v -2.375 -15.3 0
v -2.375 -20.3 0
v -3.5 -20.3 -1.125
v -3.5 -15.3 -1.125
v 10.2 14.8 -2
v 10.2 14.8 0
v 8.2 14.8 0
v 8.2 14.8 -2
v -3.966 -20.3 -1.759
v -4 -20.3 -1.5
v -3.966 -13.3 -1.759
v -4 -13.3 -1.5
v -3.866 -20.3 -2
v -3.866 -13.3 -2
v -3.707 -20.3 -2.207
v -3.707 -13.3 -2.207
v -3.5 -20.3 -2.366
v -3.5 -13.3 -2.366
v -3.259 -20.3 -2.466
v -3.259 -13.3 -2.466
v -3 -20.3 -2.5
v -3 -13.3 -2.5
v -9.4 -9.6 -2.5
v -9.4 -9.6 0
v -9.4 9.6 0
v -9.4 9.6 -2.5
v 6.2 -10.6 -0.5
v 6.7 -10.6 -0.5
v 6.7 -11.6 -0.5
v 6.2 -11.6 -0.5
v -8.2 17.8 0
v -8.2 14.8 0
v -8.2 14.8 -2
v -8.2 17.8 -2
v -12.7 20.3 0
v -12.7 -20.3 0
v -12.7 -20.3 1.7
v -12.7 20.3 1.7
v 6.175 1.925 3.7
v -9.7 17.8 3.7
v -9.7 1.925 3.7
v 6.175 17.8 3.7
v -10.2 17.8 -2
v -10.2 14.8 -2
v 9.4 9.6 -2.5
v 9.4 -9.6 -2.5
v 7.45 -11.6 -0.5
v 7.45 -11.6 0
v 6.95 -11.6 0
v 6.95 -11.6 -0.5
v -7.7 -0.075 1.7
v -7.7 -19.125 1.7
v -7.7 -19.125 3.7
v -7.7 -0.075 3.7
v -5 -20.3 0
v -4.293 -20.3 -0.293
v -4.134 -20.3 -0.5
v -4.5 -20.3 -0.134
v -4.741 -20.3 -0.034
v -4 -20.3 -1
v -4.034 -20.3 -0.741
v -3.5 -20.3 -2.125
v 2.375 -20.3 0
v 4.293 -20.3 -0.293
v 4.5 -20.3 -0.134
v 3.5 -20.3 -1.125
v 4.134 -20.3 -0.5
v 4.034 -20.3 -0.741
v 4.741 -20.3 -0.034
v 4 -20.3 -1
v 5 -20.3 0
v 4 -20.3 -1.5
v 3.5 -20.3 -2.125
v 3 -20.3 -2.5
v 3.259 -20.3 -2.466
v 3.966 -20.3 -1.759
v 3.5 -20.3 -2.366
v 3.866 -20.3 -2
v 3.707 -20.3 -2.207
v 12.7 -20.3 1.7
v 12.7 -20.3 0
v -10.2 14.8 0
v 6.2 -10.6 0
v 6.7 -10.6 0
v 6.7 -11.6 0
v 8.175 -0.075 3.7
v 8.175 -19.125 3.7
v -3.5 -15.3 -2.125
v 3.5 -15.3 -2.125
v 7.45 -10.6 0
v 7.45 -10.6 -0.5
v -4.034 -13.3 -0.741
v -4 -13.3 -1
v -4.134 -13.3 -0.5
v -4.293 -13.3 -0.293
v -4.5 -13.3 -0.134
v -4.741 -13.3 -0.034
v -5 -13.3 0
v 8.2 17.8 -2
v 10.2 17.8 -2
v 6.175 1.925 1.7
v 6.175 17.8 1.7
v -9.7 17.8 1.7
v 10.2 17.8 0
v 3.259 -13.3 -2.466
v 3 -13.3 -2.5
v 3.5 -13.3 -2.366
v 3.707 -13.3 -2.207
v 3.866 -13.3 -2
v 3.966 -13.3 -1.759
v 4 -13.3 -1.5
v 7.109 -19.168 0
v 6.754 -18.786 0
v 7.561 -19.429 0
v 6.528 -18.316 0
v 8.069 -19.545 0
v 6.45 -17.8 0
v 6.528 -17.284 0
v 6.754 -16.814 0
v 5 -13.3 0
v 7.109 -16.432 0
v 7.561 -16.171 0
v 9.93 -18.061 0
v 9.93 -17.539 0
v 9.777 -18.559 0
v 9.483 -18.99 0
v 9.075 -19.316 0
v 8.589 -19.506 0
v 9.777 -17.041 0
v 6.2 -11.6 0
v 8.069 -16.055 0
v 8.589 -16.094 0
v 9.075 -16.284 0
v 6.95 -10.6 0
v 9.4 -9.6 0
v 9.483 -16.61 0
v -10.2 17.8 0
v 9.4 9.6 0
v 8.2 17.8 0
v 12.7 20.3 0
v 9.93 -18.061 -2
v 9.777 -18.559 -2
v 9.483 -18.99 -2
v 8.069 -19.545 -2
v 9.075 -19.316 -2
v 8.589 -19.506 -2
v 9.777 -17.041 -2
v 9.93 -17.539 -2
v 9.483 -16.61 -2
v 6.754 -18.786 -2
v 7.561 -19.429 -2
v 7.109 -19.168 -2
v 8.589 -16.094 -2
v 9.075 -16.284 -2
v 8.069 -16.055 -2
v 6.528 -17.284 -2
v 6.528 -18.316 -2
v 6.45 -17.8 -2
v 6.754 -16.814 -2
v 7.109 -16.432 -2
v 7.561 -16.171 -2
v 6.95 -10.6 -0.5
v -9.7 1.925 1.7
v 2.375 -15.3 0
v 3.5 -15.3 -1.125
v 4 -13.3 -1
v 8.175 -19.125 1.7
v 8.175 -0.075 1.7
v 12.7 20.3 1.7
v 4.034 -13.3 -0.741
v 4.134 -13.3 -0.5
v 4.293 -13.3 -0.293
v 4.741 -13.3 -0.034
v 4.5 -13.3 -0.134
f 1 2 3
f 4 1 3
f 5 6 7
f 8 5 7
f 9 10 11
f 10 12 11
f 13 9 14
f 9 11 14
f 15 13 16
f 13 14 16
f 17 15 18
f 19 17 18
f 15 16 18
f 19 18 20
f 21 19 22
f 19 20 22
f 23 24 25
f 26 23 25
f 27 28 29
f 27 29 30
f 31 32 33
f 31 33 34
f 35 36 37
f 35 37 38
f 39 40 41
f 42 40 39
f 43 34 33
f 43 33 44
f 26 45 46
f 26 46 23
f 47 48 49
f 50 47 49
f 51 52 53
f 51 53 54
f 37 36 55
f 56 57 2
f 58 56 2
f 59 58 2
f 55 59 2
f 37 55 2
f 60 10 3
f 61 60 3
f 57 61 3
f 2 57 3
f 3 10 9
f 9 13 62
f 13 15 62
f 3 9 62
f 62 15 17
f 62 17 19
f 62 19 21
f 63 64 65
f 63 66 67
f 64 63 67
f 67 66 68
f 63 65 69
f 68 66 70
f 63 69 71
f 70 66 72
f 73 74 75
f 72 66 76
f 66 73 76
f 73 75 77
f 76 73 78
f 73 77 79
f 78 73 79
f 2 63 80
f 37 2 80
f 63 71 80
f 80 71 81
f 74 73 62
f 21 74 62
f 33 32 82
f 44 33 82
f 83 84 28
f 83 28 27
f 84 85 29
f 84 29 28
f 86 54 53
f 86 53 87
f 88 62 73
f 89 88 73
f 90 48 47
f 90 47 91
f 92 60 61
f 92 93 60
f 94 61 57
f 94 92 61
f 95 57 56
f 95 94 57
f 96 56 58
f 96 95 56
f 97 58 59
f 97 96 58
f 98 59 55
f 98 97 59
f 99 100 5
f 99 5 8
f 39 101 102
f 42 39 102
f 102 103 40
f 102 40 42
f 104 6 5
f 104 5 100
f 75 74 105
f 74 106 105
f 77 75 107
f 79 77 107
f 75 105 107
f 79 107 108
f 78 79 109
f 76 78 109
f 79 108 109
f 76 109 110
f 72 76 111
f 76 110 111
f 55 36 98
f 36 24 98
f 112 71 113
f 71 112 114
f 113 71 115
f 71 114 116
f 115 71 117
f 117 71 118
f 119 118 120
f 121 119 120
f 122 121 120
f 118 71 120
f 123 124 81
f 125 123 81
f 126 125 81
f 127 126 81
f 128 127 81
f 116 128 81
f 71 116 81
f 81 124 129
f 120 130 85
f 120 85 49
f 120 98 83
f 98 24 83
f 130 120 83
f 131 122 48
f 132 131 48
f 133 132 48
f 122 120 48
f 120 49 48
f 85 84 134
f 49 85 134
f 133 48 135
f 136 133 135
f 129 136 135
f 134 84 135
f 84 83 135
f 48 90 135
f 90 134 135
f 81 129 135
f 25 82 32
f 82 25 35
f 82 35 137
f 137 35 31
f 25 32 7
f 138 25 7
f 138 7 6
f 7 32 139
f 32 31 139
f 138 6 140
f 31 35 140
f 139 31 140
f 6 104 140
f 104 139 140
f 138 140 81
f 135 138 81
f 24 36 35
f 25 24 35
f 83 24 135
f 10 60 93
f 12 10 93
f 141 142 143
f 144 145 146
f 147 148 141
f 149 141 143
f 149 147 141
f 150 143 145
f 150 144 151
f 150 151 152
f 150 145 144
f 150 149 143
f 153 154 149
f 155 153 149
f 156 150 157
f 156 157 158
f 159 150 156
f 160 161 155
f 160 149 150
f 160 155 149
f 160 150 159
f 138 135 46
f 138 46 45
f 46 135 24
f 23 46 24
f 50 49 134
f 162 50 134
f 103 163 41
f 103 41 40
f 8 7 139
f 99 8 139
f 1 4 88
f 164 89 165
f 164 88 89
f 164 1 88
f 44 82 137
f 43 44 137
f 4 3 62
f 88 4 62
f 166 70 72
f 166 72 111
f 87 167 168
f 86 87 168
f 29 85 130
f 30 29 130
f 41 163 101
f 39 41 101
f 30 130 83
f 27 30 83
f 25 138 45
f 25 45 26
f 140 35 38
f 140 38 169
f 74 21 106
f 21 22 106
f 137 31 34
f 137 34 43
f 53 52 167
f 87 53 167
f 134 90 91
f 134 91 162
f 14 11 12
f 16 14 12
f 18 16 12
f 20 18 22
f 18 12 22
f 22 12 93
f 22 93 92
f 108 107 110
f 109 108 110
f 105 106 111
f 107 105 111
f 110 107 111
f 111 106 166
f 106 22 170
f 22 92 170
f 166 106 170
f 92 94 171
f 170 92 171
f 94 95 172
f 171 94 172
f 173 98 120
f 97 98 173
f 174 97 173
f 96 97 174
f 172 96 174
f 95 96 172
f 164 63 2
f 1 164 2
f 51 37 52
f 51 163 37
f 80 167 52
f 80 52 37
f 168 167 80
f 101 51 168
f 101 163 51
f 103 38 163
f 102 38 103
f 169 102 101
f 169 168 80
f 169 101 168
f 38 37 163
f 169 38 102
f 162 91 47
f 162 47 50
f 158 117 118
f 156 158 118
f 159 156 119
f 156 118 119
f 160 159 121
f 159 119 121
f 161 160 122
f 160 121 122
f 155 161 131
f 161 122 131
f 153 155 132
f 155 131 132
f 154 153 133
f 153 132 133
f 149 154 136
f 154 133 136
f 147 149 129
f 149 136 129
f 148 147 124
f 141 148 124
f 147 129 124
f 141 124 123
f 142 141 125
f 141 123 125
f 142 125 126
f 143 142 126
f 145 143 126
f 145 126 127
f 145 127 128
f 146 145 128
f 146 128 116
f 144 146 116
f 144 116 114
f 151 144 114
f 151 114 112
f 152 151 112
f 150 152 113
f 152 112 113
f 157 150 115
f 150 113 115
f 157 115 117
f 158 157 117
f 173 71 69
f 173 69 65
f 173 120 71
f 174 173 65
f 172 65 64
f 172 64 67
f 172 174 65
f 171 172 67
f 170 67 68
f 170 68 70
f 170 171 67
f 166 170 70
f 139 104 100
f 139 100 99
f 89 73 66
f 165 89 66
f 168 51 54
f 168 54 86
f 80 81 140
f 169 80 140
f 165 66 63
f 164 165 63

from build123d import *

# Parameters (mm, degrees)
SKETCH1_W           = 25.4
SKETCH1_H           = 40.6
BOSS_EXTRUDE1_DEPTH = 1.7
SKETCH2_W           = 8
SKETCH2_H           = 7
BOSS_EXTRUDE2_DEPTH = 2.5
CUT_EXTRUDE2_DEPTH  = 5
FILLET1_R           = 1
FILLET2_R           = 1
SKETCH4_W           = 18.8
SKETCH4_H           = 19.2
BOSS_EXTRUDE3_DEPTH = 2.5
SKETCH5_R           = 1.75
BOSS_EXTRUDE4_DEPTH = 2
SKETCH6_W           = 0.5
SKETCH6_H           = 1
BOSS_EXTRUDE5_DEPTH = 0.5
SKETCH7_W           = 2
SKETCH7_H           = 3
BOSS_EXTRUDE6_DEPTH = 2
SKETCH8_W           = 15.875
SKETCH8_H           = 15.875
SKETCH8_H_2         = 19.05
BOSS_EXTRUDE7_DEPTH = 2


with BuildPart() as part:
    # Sketch1 → Boss-Extrude1 (new body)
    with BuildSketch(Plane.XY):
        Rectangle(SKETCH1_W, SKETCH1_H)
    extrude(amount=BOSS_EXTRUDE1_DEPTH)

    # Sketch2 → Boss-Extrude2 (add)
    with BuildSketch(Plane.XY):
        with Locations((0, -16.8)):
            Rectangle(SKETCH2_W, SKETCH2_H)
    extrude(amount=-BOSS_EXTRUDE2_DEPTH)

    # Sketch3 → Cut-Extrude2 (cut)
    with BuildSketch(Plane.XZ.offset(20.3)):
        Polygon((3.5, -2.125), (3.5, -1.125), (2.375, 0), (-2.375, 0), (-3.5, -1.125), (-3.5, -2.125), align=None)
    extrude(amount=-CUT_EXTRUDE2_DEPTH, mode=Mode.SUBTRACT)

    # Fillet1
    fillet1_edges = [part.edges().sort_by_distance(p)[0] for p in [
        (4, -16.8, -2.5),
        (-4, -16.8, -2.5),
    ]]
    fillet(fillet1_edges, radius=FILLET1_R)

    # Fillet2
    fillet2_edges = [part.edges().sort_by_distance(p)[0] for p in [
        (4, -16.8, 0),
        (-4, -16.8, 0),
    ]]
    fillet(fillet2_edges, radius=FILLET2_R)

    # Sketch4 → Boss-Extrude3 (add)
    with BuildSketch(Plane(origin=(0, 0, 0), x_dir=(-1, 0, 0), z_dir=(0, 0, -1))):
        Rectangle(SKETCH4_W, SKETCH4_H)
    extrude(amount=BOSS_EXTRUDE3_DEPTH)

    # Sketch5 → Boss-Extrude4 (add)
    with BuildSketch(Plane(origin=(0, 0, 0), x_dir=(-1, 0, 0), z_dir=(0, 0, -1))):
        with Locations((-8.2, -17.8)):
            Circle(SKETCH5_R)
    extrude(amount=BOSS_EXTRUDE4_DEPTH)

    # Sketch6 → Boss-Extrude5 (add)
    with BuildSketch(Plane(origin=(0, 0, 0), x_dir=(-1, 0, 0), z_dir=(0, 0, -1))):
        with Locations((-7.2, -11.1)):
            Rectangle(SKETCH6_W, SKETCH6_H)
        with Locations((-6.45, -11.1)):
            Rectangle(SKETCH6_W, SKETCH6_H)
    extrude(amount=BOSS_EXTRUDE5_DEPTH)

    # Sketch7 → Boss-Extrude6 (add)
    with BuildSketch(Plane(origin=(0, 0, 0), x_dir=(-1, 0, 0), z_dir=(0, 0, -1))):
        with Locations((-9.2, 16.3)):
            Rectangle(SKETCH7_W, SKETCH7_H)
        with Locations((9.2, 16.3)):
            Rectangle(SKETCH7_W, SKETCH7_H)
    extrude(amount=BOSS_EXTRUDE6_DEPTH)

    # Sketch8 → Boss-Extrude7 (add)
    with BuildSketch(Plane.XY.offset(1.7)):
        with Locations((-1.7625, 9.8625)):
            Rectangle(SKETCH8_W, SKETCH8_H)
        with Locations((0.2375, -9.6)):
            Rectangle(SKETCH8_W, SKETCH8_H_2)
    extrude(amount=BOSS_EXTRUDE7_DEPTH)


solid = part.part
